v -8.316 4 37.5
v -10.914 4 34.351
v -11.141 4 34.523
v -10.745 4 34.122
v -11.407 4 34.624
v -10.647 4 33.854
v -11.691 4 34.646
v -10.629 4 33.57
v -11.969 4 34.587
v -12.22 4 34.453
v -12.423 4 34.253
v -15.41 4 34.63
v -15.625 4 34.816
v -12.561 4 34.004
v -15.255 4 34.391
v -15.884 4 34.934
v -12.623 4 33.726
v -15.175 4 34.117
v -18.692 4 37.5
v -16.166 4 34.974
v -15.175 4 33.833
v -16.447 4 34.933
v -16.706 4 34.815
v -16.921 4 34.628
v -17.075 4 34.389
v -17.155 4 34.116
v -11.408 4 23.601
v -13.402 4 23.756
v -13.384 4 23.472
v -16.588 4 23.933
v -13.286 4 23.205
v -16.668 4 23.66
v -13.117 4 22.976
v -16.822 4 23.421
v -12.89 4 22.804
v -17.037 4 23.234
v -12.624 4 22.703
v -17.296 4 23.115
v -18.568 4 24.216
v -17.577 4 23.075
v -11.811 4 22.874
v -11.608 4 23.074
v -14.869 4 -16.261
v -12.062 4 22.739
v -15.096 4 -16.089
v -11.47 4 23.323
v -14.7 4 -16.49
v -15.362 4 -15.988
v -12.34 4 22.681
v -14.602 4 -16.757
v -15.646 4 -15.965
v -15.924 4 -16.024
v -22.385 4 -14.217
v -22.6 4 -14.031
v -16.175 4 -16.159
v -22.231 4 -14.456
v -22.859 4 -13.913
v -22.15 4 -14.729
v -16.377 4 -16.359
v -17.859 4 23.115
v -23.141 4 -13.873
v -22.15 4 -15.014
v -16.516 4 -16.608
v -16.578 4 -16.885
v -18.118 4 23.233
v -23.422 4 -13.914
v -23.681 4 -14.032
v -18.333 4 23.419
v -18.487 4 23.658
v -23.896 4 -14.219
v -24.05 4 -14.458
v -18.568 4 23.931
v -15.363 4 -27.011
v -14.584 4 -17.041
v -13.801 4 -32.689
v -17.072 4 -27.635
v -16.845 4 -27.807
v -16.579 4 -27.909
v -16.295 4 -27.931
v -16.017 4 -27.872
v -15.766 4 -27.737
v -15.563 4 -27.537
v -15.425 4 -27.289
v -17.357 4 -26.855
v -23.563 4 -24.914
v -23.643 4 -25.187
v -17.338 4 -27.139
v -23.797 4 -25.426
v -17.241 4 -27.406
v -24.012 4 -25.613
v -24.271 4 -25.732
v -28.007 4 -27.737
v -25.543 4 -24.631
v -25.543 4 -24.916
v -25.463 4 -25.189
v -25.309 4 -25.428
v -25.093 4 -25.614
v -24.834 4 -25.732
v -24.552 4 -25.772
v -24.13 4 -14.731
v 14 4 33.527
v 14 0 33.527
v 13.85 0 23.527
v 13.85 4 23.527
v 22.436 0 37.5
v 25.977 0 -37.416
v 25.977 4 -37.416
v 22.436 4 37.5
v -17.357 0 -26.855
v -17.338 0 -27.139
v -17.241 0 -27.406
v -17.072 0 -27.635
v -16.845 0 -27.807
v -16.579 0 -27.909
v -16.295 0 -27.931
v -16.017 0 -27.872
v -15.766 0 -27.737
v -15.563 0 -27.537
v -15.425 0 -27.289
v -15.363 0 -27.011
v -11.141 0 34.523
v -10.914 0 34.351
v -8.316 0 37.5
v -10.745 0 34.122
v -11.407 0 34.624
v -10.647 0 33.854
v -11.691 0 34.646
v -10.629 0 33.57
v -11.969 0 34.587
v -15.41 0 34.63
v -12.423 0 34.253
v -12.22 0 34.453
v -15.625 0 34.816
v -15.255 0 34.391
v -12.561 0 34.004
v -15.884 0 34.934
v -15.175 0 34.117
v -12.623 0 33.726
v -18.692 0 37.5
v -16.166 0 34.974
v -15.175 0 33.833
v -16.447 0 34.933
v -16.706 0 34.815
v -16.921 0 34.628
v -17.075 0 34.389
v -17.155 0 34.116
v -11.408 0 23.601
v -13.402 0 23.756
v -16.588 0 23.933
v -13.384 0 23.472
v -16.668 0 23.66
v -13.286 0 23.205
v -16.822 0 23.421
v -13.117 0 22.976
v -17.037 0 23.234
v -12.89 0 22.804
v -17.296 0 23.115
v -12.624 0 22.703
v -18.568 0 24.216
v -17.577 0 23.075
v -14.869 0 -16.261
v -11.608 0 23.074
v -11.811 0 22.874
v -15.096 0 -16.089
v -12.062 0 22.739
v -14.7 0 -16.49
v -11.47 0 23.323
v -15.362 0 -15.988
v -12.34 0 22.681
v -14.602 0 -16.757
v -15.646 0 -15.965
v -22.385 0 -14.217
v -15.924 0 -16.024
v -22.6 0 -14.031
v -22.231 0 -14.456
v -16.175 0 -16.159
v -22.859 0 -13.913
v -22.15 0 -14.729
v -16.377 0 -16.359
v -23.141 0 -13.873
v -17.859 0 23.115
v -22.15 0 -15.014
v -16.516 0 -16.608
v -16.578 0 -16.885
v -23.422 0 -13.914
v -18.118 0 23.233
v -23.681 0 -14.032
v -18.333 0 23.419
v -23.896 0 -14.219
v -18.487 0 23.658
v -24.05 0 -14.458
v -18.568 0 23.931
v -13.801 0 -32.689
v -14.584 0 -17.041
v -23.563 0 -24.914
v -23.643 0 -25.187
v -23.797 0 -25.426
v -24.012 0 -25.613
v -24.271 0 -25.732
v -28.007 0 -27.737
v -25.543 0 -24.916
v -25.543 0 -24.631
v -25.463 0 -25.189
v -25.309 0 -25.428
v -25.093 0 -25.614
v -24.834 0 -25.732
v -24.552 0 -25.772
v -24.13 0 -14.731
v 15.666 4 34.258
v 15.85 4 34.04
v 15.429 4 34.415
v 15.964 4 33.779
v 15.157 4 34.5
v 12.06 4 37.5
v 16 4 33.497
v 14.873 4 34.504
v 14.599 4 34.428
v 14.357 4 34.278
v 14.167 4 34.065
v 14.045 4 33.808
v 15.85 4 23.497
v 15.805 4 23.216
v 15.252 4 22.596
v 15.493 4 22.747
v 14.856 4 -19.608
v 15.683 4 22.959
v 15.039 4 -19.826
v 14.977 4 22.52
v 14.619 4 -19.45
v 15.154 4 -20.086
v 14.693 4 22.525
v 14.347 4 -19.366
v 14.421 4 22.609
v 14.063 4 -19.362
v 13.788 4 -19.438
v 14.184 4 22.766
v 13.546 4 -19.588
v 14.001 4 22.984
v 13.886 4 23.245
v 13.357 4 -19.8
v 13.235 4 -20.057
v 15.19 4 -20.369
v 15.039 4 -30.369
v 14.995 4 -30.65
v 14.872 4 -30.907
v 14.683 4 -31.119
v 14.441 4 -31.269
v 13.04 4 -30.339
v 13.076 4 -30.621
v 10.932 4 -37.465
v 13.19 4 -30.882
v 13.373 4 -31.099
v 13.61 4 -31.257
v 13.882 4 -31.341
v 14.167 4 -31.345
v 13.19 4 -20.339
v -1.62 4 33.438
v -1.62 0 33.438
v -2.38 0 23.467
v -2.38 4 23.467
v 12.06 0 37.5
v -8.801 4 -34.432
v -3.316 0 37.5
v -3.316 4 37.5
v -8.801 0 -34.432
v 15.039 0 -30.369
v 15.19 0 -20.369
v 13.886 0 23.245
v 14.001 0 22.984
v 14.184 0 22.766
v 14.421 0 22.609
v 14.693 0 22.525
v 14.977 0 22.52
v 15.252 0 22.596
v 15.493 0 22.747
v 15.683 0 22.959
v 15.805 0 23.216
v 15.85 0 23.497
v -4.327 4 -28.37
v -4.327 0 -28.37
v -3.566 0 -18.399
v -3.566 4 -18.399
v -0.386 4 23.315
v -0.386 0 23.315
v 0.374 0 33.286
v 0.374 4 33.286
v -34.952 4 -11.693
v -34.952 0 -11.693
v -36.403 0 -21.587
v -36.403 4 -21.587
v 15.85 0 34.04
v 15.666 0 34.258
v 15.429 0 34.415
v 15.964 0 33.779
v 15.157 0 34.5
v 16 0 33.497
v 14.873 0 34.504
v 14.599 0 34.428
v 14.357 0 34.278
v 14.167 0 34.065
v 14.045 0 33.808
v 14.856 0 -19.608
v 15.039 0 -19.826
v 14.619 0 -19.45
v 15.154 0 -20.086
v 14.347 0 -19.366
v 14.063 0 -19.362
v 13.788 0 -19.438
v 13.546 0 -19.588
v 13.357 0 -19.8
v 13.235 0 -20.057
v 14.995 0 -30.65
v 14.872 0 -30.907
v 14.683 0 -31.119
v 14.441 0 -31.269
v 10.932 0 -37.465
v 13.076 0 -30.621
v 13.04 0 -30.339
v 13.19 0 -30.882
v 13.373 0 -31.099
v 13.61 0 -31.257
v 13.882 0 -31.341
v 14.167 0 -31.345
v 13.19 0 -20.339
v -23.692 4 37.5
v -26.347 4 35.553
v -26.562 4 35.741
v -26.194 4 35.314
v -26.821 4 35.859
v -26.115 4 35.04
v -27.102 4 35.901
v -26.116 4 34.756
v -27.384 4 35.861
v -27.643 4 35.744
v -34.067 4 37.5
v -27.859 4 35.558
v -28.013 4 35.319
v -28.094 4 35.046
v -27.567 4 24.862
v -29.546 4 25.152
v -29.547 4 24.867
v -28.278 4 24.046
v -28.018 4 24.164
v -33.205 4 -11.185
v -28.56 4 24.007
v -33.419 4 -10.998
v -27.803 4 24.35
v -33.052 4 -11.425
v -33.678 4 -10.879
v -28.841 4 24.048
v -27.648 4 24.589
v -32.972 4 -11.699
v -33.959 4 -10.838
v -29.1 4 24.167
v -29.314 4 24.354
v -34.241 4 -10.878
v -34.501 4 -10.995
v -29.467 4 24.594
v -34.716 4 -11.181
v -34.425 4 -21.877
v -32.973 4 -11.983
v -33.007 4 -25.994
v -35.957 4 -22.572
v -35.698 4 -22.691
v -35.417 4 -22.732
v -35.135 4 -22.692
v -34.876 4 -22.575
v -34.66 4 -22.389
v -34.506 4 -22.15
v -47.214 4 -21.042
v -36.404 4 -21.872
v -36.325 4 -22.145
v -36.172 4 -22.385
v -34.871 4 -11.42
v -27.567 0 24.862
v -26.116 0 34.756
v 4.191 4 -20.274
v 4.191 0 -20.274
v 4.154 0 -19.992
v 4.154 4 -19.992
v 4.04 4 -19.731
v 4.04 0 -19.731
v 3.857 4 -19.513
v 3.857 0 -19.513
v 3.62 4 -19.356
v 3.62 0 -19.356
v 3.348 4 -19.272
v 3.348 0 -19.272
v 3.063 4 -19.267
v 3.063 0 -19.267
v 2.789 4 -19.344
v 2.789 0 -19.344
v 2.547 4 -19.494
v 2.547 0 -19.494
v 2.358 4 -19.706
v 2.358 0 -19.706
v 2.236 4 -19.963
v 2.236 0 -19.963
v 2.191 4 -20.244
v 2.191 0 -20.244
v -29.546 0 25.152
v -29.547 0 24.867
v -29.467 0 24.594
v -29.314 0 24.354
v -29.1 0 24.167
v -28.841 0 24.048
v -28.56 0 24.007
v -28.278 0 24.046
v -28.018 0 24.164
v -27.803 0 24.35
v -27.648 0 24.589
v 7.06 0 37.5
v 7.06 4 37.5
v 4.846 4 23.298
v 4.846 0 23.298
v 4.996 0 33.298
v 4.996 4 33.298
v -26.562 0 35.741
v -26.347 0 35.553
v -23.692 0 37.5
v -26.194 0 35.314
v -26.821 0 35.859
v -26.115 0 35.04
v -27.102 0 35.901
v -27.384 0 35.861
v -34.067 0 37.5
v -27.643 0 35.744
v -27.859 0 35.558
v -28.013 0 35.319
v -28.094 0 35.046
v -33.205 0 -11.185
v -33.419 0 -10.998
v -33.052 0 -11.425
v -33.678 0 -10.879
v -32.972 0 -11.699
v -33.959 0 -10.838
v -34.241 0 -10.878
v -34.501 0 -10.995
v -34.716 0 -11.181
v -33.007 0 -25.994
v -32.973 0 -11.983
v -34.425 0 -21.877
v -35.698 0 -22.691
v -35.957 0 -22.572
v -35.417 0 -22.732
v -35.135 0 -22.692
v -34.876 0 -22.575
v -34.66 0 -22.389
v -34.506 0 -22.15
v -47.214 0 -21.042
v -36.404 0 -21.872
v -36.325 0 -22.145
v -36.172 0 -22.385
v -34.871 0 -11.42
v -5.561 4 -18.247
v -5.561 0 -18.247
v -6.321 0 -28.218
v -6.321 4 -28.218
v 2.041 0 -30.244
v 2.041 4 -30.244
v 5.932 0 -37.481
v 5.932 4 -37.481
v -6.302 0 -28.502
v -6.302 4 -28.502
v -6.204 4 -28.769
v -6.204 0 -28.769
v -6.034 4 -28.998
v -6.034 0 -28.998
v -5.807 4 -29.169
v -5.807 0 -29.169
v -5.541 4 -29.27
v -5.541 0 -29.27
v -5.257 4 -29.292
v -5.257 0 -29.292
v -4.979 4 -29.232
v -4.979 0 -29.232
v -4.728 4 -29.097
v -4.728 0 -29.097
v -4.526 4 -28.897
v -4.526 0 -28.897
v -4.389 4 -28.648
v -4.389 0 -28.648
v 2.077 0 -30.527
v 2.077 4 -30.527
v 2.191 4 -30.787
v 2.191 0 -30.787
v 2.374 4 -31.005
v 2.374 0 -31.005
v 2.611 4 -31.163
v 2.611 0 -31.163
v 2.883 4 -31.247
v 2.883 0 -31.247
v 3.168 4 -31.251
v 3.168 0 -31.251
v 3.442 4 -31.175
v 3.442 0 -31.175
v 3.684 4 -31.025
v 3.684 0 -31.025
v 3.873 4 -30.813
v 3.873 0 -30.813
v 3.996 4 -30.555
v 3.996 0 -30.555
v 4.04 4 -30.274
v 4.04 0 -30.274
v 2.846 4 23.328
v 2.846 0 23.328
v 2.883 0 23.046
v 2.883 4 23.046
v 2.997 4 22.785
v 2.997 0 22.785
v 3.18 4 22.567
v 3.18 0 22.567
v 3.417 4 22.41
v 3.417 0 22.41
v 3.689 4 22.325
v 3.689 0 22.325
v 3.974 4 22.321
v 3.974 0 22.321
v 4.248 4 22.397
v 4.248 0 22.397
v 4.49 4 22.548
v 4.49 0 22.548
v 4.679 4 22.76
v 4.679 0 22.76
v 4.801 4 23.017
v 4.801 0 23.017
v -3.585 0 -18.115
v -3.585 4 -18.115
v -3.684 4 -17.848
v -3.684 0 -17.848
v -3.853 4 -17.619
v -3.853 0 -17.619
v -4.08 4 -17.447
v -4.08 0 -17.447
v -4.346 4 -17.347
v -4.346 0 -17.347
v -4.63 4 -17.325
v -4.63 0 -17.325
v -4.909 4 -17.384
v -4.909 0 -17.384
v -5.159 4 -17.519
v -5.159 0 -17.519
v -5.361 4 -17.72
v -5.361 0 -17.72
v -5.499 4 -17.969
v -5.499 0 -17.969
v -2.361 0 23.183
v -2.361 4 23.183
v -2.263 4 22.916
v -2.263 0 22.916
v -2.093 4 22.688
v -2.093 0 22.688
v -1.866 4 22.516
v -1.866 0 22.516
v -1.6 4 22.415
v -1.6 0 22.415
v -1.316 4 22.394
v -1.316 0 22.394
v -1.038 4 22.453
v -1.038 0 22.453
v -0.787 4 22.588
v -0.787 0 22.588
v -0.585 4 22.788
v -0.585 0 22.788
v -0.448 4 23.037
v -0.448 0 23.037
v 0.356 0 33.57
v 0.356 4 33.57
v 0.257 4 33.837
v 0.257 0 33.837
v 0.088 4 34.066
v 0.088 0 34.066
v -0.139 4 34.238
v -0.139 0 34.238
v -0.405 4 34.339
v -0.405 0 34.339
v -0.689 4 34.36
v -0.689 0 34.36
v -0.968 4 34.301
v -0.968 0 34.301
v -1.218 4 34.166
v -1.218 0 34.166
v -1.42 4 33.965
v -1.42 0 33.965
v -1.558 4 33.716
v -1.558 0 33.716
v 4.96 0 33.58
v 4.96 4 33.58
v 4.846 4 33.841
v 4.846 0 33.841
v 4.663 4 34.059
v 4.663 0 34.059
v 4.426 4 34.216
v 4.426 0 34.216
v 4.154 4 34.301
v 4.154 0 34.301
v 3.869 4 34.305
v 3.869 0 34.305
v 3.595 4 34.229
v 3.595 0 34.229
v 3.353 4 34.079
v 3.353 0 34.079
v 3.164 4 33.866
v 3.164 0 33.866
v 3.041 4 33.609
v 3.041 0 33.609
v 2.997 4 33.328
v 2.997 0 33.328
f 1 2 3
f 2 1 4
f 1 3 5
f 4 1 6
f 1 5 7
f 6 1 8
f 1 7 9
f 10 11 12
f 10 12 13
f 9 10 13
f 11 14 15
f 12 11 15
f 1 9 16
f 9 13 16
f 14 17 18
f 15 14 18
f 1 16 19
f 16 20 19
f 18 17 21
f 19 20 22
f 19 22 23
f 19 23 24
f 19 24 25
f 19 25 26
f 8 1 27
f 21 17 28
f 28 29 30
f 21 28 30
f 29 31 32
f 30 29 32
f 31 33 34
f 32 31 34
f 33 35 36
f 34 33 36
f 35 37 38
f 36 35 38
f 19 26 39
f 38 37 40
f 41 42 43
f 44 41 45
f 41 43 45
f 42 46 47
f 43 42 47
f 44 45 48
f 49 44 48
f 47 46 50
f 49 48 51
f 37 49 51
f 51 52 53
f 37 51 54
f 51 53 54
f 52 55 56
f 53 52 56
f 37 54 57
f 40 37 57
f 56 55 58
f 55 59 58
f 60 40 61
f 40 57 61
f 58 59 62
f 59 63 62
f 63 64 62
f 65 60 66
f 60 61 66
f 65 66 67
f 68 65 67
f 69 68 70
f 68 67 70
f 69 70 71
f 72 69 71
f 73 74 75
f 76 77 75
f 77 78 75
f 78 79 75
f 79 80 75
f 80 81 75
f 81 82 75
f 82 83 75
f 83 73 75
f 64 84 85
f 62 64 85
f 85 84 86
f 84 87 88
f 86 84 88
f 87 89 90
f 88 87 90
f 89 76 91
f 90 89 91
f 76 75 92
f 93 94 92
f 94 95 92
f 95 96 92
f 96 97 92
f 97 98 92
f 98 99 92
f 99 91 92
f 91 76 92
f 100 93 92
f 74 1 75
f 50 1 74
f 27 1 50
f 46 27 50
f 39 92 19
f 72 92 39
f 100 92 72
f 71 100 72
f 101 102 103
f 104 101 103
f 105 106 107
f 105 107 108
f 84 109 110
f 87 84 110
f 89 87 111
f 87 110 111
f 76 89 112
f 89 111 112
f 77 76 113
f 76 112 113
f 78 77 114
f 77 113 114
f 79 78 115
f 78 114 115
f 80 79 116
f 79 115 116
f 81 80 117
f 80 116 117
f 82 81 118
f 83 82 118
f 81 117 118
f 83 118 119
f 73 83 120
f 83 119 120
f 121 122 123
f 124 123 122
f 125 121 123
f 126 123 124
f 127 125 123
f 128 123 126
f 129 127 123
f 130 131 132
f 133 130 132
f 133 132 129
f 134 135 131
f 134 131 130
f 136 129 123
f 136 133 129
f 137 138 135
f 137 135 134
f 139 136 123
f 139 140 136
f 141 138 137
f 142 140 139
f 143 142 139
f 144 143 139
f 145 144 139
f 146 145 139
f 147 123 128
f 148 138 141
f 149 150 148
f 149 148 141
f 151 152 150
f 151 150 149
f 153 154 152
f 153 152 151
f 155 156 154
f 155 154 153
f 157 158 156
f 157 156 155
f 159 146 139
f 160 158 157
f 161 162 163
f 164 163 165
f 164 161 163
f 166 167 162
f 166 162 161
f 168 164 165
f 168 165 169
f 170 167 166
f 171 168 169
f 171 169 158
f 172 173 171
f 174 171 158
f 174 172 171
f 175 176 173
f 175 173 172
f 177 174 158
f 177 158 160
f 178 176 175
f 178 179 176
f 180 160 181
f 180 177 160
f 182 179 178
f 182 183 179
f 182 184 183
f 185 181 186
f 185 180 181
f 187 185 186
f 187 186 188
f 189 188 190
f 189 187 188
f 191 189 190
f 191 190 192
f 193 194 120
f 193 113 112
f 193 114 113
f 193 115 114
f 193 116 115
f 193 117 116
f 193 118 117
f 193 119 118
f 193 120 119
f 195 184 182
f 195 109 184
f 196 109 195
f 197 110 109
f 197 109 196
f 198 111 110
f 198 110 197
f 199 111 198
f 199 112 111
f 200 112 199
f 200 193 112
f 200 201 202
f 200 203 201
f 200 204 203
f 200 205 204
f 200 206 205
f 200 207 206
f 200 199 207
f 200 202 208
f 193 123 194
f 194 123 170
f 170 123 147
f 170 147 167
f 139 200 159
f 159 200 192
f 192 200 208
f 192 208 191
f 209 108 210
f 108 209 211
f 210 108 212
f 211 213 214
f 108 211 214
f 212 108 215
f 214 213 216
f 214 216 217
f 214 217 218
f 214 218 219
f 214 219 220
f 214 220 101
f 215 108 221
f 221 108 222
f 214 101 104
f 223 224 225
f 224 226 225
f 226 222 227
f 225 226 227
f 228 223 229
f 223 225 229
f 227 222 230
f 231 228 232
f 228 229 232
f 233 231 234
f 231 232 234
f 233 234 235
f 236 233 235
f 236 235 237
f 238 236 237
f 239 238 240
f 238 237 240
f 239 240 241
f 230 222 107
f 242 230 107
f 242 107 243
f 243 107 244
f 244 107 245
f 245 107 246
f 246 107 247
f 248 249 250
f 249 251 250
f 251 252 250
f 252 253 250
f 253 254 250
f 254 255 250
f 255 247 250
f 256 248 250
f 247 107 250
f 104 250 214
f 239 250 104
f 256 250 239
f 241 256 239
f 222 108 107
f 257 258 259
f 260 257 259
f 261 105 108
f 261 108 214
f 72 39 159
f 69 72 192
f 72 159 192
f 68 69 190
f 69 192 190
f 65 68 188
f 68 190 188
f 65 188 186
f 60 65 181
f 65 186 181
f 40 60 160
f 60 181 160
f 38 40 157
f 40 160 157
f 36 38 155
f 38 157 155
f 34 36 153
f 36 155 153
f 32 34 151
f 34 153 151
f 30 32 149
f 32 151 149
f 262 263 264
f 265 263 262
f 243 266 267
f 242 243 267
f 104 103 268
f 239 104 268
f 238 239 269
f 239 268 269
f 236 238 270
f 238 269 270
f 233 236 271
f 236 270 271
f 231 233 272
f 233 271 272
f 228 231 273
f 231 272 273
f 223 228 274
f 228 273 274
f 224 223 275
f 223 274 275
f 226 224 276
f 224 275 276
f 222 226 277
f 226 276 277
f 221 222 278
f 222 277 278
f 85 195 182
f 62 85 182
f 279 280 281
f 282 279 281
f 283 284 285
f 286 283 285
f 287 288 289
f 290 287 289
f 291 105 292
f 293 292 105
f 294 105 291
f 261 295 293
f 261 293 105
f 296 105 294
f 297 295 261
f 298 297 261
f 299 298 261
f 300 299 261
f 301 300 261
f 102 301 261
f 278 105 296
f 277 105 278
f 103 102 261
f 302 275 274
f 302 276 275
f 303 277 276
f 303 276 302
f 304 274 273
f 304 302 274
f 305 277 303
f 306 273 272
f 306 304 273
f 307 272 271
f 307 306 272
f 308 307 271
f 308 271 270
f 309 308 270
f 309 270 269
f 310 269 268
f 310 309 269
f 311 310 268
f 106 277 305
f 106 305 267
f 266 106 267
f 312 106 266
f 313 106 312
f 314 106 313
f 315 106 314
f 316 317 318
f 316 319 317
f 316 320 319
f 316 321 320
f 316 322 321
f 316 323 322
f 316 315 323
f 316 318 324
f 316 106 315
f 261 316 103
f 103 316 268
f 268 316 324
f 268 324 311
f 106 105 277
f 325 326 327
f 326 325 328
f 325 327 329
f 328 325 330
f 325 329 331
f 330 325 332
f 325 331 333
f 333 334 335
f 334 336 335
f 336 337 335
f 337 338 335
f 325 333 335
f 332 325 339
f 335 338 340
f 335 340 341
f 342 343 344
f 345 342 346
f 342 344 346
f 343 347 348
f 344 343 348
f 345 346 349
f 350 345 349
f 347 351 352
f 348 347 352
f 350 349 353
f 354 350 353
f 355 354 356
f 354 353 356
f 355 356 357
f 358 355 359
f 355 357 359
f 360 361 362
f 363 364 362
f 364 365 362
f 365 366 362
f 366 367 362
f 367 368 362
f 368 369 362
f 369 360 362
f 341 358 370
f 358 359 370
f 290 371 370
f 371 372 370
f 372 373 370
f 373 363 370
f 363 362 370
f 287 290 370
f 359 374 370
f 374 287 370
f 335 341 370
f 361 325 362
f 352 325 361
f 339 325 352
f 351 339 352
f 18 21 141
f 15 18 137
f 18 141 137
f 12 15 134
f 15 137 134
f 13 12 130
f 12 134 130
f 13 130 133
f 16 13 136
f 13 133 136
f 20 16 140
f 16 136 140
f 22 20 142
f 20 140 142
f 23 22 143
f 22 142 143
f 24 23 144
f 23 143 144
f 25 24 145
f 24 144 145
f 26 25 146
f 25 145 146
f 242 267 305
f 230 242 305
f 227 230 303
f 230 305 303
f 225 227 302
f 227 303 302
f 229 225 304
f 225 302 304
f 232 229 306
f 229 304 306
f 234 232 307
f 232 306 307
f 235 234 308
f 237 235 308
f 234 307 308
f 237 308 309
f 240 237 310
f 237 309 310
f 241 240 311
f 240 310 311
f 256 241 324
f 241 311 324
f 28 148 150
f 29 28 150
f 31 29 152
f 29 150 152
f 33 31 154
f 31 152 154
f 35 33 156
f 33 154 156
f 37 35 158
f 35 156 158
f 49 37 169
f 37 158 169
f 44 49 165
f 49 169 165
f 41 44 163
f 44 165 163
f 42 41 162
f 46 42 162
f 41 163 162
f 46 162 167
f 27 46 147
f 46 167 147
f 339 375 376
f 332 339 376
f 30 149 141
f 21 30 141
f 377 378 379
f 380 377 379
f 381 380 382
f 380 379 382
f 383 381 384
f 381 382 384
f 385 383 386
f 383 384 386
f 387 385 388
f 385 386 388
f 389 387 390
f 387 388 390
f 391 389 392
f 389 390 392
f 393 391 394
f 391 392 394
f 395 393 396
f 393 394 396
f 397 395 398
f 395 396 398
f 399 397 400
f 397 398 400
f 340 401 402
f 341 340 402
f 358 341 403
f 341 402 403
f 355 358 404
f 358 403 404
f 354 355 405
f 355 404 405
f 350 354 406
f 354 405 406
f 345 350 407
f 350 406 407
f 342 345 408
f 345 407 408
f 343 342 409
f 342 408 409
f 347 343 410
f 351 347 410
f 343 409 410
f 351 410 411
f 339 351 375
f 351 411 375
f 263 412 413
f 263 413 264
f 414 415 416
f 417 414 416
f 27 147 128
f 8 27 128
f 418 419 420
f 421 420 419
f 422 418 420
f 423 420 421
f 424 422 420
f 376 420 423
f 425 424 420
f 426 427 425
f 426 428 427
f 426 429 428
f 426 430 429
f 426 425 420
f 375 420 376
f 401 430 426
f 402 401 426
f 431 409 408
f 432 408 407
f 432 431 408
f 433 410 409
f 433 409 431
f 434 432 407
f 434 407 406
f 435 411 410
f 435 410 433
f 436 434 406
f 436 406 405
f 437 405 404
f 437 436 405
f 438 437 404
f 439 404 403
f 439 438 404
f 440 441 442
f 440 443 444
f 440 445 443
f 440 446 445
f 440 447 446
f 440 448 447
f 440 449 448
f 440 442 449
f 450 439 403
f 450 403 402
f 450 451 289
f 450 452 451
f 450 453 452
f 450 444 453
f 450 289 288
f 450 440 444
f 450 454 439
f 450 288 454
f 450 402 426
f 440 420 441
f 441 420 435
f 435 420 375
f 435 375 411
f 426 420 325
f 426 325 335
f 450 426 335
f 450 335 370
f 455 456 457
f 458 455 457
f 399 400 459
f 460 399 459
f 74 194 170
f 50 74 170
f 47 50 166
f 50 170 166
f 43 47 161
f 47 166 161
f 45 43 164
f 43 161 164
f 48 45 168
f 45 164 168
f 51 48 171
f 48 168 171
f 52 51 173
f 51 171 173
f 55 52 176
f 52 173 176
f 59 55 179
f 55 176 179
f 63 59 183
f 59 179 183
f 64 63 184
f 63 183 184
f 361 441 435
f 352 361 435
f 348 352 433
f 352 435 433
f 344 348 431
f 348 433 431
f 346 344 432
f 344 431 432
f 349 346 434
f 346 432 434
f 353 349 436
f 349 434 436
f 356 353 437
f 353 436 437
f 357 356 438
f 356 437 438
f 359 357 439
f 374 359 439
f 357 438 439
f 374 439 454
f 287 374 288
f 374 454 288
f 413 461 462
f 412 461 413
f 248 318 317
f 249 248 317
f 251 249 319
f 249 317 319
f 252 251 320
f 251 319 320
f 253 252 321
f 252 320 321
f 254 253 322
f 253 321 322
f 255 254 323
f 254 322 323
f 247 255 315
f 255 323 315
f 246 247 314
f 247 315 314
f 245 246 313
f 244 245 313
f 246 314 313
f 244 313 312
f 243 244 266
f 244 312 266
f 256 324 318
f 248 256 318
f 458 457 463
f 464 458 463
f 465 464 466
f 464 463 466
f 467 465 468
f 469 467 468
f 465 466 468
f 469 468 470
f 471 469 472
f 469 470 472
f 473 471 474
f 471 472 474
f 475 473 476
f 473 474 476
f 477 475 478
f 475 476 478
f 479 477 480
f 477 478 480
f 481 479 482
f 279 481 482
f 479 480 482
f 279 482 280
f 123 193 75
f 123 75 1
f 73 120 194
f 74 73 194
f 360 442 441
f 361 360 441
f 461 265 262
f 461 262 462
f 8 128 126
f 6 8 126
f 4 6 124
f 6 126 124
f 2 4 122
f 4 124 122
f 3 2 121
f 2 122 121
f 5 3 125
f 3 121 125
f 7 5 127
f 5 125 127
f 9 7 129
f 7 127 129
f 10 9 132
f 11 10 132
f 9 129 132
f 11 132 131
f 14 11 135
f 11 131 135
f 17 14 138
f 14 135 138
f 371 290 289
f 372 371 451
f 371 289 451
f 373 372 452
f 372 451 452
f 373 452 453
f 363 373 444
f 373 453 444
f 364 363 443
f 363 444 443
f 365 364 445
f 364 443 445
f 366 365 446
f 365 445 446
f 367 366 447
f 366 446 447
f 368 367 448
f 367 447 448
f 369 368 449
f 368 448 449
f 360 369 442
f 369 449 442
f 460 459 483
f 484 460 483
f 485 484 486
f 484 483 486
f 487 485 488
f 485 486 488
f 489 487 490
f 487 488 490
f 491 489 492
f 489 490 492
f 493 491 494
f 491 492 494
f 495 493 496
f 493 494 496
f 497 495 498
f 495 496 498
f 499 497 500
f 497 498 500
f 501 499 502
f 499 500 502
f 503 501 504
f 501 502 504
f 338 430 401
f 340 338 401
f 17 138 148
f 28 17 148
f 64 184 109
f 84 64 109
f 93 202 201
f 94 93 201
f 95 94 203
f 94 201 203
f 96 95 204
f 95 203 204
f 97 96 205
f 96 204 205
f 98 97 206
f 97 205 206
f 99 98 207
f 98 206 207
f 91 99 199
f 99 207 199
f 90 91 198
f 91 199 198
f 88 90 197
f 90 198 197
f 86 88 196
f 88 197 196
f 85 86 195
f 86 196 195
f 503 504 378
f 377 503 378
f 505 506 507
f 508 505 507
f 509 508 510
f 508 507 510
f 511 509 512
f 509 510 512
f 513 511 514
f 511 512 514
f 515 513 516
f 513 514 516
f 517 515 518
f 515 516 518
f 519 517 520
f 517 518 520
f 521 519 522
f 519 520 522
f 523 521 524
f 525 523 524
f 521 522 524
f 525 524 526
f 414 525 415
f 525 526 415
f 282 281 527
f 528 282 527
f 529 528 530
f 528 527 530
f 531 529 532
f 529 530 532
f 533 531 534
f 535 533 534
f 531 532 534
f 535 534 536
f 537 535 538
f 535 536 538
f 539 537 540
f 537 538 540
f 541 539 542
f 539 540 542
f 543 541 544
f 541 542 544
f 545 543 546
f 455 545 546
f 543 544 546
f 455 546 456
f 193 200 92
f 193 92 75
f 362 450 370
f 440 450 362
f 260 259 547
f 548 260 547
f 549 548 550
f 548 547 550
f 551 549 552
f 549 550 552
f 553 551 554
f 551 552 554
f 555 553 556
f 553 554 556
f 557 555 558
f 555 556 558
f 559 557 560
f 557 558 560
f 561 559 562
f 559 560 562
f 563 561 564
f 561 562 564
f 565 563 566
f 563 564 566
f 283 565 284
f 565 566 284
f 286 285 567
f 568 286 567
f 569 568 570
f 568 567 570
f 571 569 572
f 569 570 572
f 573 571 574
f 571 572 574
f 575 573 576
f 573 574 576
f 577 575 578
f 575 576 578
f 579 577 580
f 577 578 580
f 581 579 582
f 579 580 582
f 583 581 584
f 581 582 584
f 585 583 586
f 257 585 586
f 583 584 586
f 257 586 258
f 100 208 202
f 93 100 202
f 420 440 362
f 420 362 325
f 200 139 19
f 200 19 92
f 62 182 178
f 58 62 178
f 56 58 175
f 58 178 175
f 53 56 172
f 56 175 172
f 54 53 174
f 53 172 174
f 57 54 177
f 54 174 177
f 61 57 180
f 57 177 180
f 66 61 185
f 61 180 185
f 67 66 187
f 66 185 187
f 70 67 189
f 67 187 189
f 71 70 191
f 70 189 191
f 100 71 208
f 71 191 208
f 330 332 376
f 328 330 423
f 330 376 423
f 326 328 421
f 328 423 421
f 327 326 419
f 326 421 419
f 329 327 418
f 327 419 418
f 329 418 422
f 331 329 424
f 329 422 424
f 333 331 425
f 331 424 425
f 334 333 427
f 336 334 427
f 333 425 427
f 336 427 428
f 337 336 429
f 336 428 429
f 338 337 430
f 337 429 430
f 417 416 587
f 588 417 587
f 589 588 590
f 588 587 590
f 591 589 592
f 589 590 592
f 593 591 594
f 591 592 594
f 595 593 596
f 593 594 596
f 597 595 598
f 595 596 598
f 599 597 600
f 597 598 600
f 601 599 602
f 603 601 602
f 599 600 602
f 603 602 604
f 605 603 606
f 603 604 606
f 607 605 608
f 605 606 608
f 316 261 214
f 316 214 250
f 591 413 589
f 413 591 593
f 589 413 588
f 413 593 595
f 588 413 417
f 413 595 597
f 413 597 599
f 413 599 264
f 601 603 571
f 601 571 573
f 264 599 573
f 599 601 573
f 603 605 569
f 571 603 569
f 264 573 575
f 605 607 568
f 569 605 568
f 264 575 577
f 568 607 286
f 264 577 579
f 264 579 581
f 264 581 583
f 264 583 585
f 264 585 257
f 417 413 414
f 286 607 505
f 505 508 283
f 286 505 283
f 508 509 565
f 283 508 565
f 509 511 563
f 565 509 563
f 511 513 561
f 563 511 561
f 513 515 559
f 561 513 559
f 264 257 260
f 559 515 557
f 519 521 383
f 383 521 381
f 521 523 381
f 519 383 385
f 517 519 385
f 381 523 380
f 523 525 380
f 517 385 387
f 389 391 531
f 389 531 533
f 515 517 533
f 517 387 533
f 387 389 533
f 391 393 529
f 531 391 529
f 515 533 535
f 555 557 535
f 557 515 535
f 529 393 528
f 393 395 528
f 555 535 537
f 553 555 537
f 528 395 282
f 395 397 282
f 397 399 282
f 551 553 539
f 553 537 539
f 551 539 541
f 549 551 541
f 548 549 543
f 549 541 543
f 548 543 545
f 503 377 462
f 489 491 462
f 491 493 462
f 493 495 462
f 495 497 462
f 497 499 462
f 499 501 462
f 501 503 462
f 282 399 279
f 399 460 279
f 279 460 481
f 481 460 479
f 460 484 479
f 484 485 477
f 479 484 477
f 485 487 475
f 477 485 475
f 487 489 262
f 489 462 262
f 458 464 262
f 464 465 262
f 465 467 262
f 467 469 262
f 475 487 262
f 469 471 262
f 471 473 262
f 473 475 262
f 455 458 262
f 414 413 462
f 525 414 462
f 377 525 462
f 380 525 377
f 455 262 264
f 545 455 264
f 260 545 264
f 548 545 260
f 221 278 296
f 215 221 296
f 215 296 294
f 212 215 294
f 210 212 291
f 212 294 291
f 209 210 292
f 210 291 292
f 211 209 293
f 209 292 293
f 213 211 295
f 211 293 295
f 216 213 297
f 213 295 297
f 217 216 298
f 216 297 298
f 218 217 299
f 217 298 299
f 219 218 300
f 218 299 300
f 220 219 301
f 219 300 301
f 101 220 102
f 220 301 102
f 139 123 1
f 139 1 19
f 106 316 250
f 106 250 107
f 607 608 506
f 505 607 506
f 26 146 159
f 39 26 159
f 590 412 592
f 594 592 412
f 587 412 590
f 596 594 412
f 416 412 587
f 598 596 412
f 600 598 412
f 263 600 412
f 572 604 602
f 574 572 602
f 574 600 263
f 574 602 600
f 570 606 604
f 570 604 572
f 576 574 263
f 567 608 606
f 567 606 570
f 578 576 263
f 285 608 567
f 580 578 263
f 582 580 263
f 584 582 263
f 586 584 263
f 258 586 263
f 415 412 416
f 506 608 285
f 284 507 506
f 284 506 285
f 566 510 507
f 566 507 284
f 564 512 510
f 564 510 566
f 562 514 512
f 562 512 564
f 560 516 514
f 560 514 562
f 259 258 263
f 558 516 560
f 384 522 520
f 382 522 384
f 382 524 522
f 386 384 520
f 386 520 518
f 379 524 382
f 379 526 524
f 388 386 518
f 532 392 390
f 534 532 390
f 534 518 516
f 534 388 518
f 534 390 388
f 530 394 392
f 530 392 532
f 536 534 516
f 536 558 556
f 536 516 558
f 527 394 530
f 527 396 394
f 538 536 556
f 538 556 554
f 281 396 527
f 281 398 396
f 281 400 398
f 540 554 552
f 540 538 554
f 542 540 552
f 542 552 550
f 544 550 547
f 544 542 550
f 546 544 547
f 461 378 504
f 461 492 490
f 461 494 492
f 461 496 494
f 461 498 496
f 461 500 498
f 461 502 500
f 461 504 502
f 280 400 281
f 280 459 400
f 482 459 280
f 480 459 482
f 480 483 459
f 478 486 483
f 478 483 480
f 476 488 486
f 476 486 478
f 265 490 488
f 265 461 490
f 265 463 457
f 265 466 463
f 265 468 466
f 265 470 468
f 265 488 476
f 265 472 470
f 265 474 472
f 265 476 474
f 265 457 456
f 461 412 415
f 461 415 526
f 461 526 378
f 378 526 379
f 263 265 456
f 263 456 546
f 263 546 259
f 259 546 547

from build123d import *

# Parameters (mm, degrees)
BOSS_EXTRUDE1_DEPTH   = 4
BOSS_EXTRUDE1_2_DEPTH = 4
BOSS_EXTRUDE1_3_DEPTH = 4
BOSS_EXTRUDE1_4_DEPTH = 4
CUT_EXTRUDE1_DEPTH    = 5


with BuildPart() as part:
    # Sketch3 → Boss-Extrude1 (new body)
    with BuildSketch(Plane(origin=(0, 0, 0), x_dir=(1, 0, 0), z_dir=(0, 1, 0))):
        Polygon((-47.213729066, 21.042060041), (-33.007188918, 25.994229451), (-23.691598112, -37.5), (-34.067352907, -37.5), align=None)
    extrude(amount=BOSS_EXTRUDE1_DEPTH)


with BuildPart() as body_2:
    # Sketch3 → Boss-Extrude1 2 (new body)
    with BuildSketch(Plane(origin=(0, 0, 0), x_dir=(1, 0, 0), z_dir=(0, 1, 0))):
        Polygon((-28.007188918, 27.737148331), (-13.800648769, 32.68931774), (-8.315843317, -37.5), (-18.691598112, -37.5), align=None)
    extrude(amount=BOSS_EXTRUDE1_2_DEPTH)


with BuildPart() as body_3:
    # Sketch3 → Boss-Extrude1 3 (new body)
    with BuildSketch(Plane(origin=(0, 0, 0), x_dir=(1, 0, 0), z_dir=(0, 1, 0))):
        Polygon((22.435666272, -37.5), (12.059911477, -37.5), (10.932152609, 37.464795247), (25.976999486, 37.416346408), align=None)
    extrude(amount=BOSS_EXTRUDE1_3_DEPTH)


with BuildPart() as body_4:
    # Sketch3 → Boss-Extrude1 4 (new body)
    with BuildSketch(Plane(origin=(0, 0, 0), x_dir=(1, 0, 0), z_dir=(0, 1, 0))):
        Polygon((-8.800648769, 34.43223662), (5.932152609, 37.480896721), (7.059911477, -37.5), (-3.315843317, -37.5), align=None)
    extrude(amount=BOSS_EXTRUDE1_4_DEPTH)


with BuildPart() as cut_extrude1_tool:
    # Sketch4 → Cut-Extrude1 (new body, through all)
    with BuildSketch(Plane(origin=(0, 0, 0), x_dir=(1, 0, 0), z_dir=(0, 1, 0))):
        with BuildLine():
            Line((-34.42457978, 21.877283541), (-32.972964435, 11.983203852))
            ThreePointArc((-32.972964435, 11.983203852), (-33.81721087, 10.848634349), (-34.951780373, 11.692880783))
            Line((-34.951780373, 11.692880783), (-36.403395718, 21.586960472))
            ThreePointArc((-36.403395718, 21.586960472), (-35.559149283, 22.721529976), (-34.42457978, 21.877283541))
        make_face()
        with BuildLine():
            Line((-27.56726282, -24.861572382), (-26.115647475, -34.75565207))
            ThreePointArc((-26.115647475, -34.75565207), (-26.959893909, -35.890221574), (-28.094463413, -35.045975139))
            Line((-28.094463413, -35.045975139), (-29.546078757, -25.15189545))
            ThreePointArc((-29.546078757, -25.15189545), (-28.701832323, -24.017325947), (-27.56726282, -24.861572382))
        make_face()
        with BuildLine():
            Line((-23.56343255, 24.913669754), (-22.14981411, 15.014089819))
            ThreePointArc((-22.14981411, 15.014089819), (-22.99841026, 13.882769981), (-24.129730097, 14.731366131))
            Line((-24.129730097, 14.731366131), (-25.543348537, 24.630946067))
            ThreePointArc((-25.543348537, 24.630946067), (-24.694752387, 25.762265904), (-23.56343255, 24.913669754))
        make_face()
        with BuildLine():
            Line((-16.58829251, -23.933285303), (-15.17467407, -33.832865239))
            ThreePointArc((-15.17467407, -33.832865239), (-16.02327022, -34.964185076), (-17.154590057, -34.115588927))
            Line((-17.154590057, -34.115588927), (-18.568208497, -24.216008991))
            ThreePointArc((-18.568208497, -24.216008991), (-17.719612347, -23.084689153), (-16.58829251, -23.933285303))
        make_face()
        with BuildLine():
            Line((-15.363012646, 27.01084324), (-14.583957383, 17.04123578))
            ThreePointArc((-14.583957383, 17.04123578), (-15.503012603, 15.966369508), (-16.577878875, 16.885424728))
            Line((-16.577878875, 16.885424728), (-17.356934138, 26.855032187))
            ThreePointArc((-17.356934138, 26.855032187), (-16.437878918, 27.929898459), (-15.363012646, 27.01084324))
        make_face()
        with BuildLine():
            Line((-11.408077758, -23.600647707), (-10.629022496, -33.570255167))
            ThreePointArc((-10.629022496, -33.570255167), (-11.548077715, -34.645121439), (-12.622943988, -33.726066219))
            Line((-12.622943988, -33.726066219), (-13.40199925, -23.75645876))
            ThreePointArc((-13.40199925, -23.75645876), (-12.48294403, -22.681592488), (-11.408077758, -23.600647707))
        make_face()
        with BuildLine():
            Line((-4.326785443, 28.36988258), (-3.566496238, 18.398826451))
            ThreePointArc((-3.566496238, 18.398826451), (-4.48757293, 17.325691917), (-5.560707464, 18.24676861))
            Line((-5.560707464, 18.24676861), (-6.320996669, 28.217824738))
            ThreePointArc((-6.320996669, 28.217824738), (-5.399919976, 29.290959272), (-4.326785443, 28.36988258))
        make_face()
        with BuildLine():
            Line((4.04031749, 30.274337554), (4.190723649, 20.274337554))
            ThreePointArc((4.190723649, 20.274337554), (3.205875655, 19.259411729), (2.190949831, 20.244259724))
            Line((2.190949831, 20.244259724), (2.040543672, 30.244259724))
            ThreePointArc((2.040543672, 30.244259724), (3.025391666, 31.259185548), (4.04031749, 30.274337554))
        make_face()
        with BuildLine():
            Line((-0.385810436, -23.315295538), (0.374478769, -33.286351667))
            ThreePointArc((0.374478769, -33.286351667), (-0.546597923, -34.359486201), (-1.619732457, -33.438409508))
            Line((-1.619732457, -33.438409508), (-2.380021662, -23.467353379))
            ThreePointArc((-2.380021662, -23.467353379), (-1.45894497, -22.394218846), (-0.385810436, -23.315295538))
        make_face()
        with BuildLine():
            Line((4.846078374, -23.297995449), (4.996484533, -33.297995449))
            ThreePointArc((4.996484533, -33.297995449), (4.011636539, -34.312921273), (2.996710715, -33.328073278))
            Line((2.996710715, -33.328073278), (2.846304556, -23.328073278))
            ThreePointArc((2.846304556, -23.328073278), (3.83115255, -22.313147454), (4.846078374, -23.297995449))
        make_face()
        with BuildLine():
            Line((15.039358693, 30.368639682), (15.189797157, 20.368639682))
            ThreePointArc((15.189797157, 20.368639682), (14.204952441, 19.353710677), (13.190023436, 20.338555394))
            Line((13.190023436, 20.338555394), (13.039584972, 30.338555394))
            ThreePointArc((13.039584972, 30.338555394), (14.024429688, 31.353484399), (15.039358693, 30.368639682))
        make_face()
        with BuildLine():
            Line((15.849707318, -23.497147154), (16.000145783, -33.497147154))
            ThreePointArc((16.000145783, -33.497147154), (15.015301067, -34.512076159), (14.000372062, -33.527231443))
            Line((14.000372062, -33.527231443), (13.849933597, -23.527231443))
            ThreePointArc((13.849933597, -23.527231443), (14.834778313, -22.512302438), (15.849707318, -23.497147154))
        make_face()
    extrude(amount=CUT_EXTRUDE1_DEPTH)


with BuildPart() as part_1:
    add(part.part)

    # Cut-Extrude1: cut by cut_extrude1_tool
    add(cut_extrude1_tool.part, mode=Mode.SUBTRACT)


with BuildPart() as body_2_1:
    add(body_2.part)

    # Cut-Extrude1: cut by cut_extrude1_tool
    add(cut_extrude1_tool.part, mode=Mode.SUBTRACT)


with BuildPart() as body_3_1:
    add(body_3.part)

    # Cut-Extrude1: cut by cut_extrude1_tool
    add(cut_extrude1_tool.part, mode=Mode.SUBTRACT)


with BuildPart() as body_4_1:
    add(body_4.part)

    # Cut-Extrude1: cut by cut_extrude1_tool
    add(cut_extrude1_tool.part, mode=Mode.SUBTRACT)


solid = Compound([part_1.part, body_2_1.part, body_3_1.part, body_4_1.part])
